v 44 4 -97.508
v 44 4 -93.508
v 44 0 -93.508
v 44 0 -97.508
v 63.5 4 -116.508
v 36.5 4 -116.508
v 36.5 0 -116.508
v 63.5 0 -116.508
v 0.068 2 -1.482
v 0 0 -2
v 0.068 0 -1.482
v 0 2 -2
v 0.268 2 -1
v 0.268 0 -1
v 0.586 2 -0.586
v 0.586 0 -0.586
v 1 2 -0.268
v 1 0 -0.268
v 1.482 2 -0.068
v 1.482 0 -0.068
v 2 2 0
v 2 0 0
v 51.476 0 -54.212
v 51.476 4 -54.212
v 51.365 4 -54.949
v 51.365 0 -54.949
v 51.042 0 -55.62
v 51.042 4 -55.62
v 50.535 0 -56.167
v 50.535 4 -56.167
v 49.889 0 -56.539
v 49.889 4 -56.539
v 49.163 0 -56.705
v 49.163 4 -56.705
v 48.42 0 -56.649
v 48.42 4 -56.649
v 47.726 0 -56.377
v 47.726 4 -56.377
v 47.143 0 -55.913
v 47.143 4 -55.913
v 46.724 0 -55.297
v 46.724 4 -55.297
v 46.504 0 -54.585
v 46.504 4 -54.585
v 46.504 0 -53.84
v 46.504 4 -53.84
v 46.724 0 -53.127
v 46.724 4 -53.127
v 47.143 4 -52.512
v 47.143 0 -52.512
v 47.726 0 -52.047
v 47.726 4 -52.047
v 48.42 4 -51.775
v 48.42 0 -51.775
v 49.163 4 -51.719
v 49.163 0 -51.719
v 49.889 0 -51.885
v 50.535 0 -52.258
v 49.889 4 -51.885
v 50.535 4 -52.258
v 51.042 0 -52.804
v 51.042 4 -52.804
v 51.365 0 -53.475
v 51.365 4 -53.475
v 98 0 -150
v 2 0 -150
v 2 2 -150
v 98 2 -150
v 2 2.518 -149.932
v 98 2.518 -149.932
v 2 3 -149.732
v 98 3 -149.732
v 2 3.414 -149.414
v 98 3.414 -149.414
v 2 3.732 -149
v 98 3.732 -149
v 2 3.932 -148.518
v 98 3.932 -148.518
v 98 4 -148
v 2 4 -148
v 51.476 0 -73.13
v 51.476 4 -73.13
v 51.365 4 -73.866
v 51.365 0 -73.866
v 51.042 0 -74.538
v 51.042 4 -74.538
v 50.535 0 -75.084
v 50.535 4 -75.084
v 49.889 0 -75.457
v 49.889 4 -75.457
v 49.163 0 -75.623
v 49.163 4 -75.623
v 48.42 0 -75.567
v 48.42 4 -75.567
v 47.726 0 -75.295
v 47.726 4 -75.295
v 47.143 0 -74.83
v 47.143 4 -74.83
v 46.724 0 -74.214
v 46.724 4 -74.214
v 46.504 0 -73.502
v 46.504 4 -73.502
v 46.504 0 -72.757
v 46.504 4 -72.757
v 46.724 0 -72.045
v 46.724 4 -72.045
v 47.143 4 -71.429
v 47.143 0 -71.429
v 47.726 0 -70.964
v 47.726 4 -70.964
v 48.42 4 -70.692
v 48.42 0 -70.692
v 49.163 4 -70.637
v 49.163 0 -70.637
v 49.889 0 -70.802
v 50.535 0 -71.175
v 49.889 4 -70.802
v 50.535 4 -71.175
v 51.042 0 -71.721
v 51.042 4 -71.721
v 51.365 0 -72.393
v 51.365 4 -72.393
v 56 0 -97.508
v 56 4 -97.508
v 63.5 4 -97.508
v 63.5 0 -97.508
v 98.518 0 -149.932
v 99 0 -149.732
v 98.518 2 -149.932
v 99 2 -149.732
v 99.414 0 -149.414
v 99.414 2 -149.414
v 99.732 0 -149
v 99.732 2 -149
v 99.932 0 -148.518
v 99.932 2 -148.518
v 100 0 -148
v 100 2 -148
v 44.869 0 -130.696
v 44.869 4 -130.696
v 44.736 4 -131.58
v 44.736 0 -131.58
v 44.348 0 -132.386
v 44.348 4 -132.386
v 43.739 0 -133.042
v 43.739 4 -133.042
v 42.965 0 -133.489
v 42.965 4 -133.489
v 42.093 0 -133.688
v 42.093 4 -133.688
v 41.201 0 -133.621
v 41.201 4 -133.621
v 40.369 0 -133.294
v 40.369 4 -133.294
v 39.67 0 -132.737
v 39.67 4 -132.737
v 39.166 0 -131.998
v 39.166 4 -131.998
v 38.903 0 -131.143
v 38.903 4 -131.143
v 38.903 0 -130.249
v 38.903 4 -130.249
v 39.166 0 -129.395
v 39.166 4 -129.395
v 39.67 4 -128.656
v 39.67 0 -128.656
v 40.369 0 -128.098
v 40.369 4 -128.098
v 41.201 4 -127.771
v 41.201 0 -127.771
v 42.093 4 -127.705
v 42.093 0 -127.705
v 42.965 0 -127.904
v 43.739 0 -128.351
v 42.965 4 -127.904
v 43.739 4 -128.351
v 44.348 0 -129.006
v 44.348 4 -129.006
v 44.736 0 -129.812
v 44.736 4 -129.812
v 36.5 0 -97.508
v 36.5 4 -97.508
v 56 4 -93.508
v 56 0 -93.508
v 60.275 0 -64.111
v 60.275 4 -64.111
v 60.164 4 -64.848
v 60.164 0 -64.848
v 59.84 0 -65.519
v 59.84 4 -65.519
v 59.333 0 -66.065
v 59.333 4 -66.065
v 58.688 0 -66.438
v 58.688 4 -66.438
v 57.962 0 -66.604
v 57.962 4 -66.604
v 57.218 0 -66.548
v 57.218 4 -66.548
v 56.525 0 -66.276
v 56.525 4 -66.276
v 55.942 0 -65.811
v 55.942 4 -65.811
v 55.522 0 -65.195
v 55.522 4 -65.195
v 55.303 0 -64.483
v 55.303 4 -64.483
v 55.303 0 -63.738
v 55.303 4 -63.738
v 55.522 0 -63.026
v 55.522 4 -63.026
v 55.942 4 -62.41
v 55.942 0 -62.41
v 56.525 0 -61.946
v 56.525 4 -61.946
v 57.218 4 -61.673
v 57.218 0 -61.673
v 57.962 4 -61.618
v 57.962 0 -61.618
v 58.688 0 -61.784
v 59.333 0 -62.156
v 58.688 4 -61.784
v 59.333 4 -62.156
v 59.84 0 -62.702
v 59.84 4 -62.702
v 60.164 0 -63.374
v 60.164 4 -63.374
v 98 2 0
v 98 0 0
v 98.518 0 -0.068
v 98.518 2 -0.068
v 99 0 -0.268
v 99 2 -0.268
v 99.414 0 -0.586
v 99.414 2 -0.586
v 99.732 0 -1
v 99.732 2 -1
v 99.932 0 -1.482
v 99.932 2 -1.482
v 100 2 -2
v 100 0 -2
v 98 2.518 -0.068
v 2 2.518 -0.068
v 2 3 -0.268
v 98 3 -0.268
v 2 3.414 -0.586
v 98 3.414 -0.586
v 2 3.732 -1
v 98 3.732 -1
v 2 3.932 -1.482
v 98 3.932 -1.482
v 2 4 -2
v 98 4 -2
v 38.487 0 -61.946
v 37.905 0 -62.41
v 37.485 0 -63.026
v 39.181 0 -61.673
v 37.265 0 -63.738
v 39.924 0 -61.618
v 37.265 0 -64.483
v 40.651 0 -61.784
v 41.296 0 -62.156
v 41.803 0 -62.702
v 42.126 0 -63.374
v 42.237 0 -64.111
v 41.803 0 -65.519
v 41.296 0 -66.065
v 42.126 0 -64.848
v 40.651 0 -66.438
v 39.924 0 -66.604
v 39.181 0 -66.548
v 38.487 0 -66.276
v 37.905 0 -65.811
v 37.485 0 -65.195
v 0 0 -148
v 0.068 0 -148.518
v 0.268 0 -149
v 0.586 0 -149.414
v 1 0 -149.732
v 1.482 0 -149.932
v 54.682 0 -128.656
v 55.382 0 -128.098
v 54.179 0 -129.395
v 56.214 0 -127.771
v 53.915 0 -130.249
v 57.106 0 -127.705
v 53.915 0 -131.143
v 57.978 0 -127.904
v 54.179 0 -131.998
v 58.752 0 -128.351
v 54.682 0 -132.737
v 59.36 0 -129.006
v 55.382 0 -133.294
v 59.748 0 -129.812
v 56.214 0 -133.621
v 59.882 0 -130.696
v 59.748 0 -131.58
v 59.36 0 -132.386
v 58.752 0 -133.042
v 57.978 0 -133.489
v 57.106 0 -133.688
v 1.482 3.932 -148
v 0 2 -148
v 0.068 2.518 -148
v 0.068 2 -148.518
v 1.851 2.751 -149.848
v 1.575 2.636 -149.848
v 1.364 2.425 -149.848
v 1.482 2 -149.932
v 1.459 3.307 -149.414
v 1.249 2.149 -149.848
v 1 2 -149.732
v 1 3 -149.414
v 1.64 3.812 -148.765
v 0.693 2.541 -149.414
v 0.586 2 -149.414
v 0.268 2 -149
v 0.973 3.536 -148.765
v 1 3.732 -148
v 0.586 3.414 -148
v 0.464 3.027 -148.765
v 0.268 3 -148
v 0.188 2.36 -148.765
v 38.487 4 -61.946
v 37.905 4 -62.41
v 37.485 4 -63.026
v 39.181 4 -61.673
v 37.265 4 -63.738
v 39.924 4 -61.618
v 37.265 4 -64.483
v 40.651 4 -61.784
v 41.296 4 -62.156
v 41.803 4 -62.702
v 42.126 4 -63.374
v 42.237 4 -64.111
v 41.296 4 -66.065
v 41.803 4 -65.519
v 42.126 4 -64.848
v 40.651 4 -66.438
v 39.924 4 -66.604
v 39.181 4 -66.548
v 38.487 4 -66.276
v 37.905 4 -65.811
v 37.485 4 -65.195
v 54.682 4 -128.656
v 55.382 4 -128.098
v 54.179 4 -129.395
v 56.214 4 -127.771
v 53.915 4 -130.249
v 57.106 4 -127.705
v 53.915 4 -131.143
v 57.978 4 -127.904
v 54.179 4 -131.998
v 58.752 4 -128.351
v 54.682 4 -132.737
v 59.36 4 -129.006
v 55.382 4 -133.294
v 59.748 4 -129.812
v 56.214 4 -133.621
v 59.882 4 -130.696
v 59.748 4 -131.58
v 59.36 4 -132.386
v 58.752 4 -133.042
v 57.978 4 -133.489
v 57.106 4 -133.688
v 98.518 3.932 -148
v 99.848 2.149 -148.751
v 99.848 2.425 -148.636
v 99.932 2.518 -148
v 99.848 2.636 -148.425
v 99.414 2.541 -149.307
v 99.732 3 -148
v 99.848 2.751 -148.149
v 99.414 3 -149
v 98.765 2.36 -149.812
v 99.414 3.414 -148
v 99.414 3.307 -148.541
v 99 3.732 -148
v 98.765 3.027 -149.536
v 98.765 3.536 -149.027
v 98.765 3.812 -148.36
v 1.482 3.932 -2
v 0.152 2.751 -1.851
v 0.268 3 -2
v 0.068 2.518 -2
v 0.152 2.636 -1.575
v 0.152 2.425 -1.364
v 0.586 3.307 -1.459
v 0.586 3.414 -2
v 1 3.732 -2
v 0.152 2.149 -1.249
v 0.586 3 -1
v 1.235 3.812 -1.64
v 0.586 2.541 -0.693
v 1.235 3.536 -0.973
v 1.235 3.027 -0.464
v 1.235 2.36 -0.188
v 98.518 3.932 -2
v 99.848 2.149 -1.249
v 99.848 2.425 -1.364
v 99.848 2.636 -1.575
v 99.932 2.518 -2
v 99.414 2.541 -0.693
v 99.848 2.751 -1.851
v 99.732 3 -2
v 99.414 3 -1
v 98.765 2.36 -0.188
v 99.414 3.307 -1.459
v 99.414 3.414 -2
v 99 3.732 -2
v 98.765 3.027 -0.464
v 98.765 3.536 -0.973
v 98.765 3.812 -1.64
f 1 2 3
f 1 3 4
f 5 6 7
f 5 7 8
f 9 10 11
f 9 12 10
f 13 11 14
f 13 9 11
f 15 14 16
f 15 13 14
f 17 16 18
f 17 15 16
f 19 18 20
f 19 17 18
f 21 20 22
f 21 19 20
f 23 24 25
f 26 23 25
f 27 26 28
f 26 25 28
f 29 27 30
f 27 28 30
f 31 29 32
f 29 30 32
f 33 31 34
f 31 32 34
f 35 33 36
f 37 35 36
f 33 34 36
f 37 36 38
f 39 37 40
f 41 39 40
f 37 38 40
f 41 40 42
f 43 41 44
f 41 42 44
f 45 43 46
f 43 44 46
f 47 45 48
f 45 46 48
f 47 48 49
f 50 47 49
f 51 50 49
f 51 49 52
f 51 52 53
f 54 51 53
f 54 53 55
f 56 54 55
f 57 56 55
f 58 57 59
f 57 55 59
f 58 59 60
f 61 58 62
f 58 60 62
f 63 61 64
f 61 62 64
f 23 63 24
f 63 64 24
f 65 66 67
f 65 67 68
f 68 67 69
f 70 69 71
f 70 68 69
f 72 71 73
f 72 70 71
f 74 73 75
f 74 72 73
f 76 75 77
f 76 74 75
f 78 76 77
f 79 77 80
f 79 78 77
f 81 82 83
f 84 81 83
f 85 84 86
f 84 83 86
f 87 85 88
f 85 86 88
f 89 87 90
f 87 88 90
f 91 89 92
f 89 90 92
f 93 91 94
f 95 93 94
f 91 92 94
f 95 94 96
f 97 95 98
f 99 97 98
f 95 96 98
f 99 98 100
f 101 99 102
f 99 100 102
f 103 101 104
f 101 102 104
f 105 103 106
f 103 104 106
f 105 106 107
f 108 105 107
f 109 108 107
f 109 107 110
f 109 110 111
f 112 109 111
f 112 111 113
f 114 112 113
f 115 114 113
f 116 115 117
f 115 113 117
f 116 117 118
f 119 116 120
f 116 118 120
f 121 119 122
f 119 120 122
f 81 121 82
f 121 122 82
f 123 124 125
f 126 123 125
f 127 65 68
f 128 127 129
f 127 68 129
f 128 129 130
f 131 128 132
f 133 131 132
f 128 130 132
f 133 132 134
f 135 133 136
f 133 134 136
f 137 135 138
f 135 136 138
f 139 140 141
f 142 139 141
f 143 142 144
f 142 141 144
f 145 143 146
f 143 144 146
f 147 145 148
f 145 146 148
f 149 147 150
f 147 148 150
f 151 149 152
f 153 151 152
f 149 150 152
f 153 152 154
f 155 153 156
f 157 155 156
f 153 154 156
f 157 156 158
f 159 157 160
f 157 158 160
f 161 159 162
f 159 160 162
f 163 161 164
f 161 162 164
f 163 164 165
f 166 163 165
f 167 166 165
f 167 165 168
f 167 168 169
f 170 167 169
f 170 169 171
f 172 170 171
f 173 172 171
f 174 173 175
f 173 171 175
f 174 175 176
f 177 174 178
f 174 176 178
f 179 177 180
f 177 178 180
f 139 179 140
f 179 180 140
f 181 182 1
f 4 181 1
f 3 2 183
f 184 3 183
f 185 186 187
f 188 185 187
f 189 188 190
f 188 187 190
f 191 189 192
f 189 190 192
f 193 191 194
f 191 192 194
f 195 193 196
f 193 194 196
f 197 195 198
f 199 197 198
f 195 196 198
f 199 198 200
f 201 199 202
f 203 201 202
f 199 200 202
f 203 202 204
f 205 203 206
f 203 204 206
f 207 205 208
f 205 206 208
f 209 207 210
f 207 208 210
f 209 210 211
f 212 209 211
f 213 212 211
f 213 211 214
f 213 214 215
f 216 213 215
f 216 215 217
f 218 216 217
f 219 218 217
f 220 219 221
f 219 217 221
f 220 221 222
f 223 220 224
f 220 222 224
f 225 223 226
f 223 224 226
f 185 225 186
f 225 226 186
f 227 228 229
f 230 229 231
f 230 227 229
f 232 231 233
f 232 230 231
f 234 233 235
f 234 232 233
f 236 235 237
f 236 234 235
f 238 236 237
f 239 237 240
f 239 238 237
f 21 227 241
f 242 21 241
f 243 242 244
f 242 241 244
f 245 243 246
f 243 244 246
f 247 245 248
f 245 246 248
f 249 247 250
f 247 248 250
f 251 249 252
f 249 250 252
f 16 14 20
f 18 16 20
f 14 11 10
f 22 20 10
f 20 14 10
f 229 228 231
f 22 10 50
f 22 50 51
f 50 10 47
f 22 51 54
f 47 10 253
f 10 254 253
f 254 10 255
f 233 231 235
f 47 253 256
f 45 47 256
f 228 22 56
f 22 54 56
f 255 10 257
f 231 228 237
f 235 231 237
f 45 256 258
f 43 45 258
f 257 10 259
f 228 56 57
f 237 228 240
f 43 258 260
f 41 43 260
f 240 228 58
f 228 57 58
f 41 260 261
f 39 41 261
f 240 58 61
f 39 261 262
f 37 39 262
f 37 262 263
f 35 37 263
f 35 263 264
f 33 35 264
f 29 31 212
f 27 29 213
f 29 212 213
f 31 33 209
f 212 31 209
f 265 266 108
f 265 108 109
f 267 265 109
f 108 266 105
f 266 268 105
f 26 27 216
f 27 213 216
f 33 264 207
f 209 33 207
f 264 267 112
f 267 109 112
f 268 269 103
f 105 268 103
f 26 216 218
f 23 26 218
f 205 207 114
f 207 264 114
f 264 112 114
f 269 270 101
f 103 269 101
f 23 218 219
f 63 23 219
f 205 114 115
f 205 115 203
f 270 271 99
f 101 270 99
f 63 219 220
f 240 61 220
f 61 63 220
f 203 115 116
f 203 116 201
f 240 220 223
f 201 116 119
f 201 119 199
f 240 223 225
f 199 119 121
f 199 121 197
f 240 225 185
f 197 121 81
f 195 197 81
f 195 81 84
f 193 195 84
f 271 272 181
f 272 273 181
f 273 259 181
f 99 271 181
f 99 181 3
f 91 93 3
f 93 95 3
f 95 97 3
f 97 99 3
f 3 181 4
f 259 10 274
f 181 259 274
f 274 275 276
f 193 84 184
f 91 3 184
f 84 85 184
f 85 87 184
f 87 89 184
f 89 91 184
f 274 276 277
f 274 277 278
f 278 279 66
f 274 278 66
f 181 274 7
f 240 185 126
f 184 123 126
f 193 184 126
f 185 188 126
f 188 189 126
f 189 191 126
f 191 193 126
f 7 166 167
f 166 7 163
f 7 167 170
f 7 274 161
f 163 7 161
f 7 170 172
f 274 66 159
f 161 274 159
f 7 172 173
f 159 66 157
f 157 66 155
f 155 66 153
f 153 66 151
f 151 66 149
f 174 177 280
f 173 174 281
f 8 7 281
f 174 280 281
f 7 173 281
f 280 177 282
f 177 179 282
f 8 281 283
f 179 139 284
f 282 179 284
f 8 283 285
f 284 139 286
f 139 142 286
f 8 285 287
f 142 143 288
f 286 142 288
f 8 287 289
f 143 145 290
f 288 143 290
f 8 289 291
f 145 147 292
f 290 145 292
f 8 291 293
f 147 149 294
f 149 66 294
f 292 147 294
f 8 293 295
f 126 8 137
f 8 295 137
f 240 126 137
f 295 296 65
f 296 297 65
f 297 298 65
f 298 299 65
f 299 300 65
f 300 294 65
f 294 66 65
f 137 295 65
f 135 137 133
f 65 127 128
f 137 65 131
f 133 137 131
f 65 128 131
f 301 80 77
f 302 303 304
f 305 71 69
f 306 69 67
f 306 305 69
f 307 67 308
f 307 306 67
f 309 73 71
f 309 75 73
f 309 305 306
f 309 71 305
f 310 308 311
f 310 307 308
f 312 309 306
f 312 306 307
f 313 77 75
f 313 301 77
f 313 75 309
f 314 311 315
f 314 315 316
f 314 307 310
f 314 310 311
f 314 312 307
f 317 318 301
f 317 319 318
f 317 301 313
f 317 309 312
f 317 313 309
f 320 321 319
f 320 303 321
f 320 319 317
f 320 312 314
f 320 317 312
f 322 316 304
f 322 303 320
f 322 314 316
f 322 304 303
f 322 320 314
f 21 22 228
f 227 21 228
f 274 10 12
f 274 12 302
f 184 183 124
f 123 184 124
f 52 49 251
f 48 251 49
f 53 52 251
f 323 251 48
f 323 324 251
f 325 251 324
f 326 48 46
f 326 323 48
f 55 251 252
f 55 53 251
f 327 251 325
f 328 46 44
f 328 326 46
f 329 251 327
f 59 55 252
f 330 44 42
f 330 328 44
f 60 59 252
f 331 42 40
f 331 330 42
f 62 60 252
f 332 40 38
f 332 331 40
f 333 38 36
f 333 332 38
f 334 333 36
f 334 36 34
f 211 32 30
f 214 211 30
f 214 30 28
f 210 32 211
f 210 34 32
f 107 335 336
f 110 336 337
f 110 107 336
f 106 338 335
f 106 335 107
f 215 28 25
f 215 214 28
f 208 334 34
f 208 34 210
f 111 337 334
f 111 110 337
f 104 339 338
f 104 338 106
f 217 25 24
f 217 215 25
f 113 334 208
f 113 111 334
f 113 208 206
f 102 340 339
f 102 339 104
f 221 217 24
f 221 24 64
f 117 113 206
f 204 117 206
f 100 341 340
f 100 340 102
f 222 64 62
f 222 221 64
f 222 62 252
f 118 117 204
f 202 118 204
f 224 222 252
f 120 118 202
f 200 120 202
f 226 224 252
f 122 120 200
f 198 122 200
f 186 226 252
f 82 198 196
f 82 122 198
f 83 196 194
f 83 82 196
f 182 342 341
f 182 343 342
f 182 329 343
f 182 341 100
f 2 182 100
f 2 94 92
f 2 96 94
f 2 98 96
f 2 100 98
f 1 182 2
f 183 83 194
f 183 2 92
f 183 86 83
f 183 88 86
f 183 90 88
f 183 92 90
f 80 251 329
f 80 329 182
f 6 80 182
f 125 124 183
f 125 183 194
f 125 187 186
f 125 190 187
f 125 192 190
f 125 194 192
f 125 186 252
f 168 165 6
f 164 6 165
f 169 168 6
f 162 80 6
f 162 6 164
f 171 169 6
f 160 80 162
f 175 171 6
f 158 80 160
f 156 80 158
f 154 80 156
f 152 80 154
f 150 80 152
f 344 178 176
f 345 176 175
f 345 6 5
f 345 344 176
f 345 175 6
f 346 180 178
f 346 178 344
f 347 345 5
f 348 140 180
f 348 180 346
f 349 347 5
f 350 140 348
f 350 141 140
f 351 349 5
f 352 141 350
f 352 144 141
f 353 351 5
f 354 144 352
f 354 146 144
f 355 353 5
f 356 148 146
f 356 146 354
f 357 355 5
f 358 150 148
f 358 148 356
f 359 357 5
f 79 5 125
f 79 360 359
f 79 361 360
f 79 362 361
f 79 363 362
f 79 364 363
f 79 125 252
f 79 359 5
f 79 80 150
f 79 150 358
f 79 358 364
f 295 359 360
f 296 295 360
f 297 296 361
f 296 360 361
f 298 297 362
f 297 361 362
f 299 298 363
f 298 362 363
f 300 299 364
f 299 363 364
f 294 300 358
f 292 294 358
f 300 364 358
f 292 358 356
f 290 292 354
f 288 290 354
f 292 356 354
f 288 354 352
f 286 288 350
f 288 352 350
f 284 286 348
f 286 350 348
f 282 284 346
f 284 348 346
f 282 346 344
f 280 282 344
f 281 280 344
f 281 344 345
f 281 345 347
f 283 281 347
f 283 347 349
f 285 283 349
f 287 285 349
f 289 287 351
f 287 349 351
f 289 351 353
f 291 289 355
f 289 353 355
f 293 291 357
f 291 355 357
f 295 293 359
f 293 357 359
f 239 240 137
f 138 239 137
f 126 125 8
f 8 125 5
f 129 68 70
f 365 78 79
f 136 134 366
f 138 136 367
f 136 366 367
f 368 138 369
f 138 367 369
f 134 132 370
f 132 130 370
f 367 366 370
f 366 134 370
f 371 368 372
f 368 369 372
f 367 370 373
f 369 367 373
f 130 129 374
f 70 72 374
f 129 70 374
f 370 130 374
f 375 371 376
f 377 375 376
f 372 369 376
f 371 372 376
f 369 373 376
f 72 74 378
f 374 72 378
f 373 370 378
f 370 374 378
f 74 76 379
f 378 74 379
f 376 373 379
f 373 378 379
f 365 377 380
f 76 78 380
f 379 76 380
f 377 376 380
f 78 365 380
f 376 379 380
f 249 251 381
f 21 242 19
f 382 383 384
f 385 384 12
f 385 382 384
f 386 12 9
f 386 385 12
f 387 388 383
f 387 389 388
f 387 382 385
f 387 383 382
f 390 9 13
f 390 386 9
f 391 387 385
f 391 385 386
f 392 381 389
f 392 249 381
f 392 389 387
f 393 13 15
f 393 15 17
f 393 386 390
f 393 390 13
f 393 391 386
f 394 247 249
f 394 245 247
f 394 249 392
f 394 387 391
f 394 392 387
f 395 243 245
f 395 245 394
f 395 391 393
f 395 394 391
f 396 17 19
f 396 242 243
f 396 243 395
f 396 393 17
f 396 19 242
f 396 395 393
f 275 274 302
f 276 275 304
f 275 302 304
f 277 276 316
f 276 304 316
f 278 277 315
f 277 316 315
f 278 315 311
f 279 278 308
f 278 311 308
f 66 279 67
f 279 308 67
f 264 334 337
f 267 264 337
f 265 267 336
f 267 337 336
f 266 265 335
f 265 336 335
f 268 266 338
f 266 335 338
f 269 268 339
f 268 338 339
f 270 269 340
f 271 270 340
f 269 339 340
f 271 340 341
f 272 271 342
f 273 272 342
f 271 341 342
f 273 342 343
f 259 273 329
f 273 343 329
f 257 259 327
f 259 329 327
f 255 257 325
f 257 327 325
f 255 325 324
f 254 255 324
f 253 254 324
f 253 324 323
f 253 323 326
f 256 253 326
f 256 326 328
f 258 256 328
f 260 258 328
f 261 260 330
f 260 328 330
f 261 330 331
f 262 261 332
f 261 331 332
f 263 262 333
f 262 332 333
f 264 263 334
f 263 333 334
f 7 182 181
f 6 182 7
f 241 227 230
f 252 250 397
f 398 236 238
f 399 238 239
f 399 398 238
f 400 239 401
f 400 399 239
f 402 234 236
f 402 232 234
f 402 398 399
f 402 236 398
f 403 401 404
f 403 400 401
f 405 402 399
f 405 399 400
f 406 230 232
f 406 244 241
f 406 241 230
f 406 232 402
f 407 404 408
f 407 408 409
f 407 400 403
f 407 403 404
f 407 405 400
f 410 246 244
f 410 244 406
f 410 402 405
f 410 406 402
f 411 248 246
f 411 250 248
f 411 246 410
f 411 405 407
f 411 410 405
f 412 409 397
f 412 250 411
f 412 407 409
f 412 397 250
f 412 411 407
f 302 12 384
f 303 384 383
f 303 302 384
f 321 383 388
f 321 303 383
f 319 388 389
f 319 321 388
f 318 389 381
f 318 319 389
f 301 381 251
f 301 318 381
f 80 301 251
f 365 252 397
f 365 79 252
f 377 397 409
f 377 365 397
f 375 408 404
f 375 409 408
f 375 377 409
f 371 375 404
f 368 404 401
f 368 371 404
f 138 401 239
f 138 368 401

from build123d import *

# Parameters (mm, degrees)
SKETCH1_W           = 100
SKETCH1_H           = 150
BOSS_EXTRUDE1_DEPTH = 4
CUT_EXTRUDE1_DEPTH  = 4
SKETCH2_4_W         = 12
SKETCH2_4_H         = 4
CUT_EXTRUDE2_DEPTH  = 4
SKETCH3_R           = 2.5
CUT_EXTRUDE3_DEPTH  = 4
SKETCH4_R           = 3
CUT_EXTRUDE4_DEPTH  = 4
FILLET1_R           = 2


with BuildPart() as part:
    # Sketch1 → Boss-Extrude1 (new body)
    with BuildSketch(Plane(origin=(0, 0, 0), x_dir=(1, 0, 0), z_dir=(0, 1, 0))):
        with Locations((50, 75)):
            Rectangle(SKETCH1_W, SKETCH1_H)
    extrude(amount=BOSS_EXTRUDE1_DEPTH)

    # Sketch2 → Cut-Extrude1 (cut)
    with BuildSketch(Plane(origin=(0, 4, 0), x_dir=(1, 0, 0), z_dir=(0, 1, 0))):
        Polygon((63.5, 116.508398101), (36.5, 116.508398101), (36.5, 97.508398101), (44, 97.508398101), (56, 97.508398101), (63.5, 97.508398101), align=None)
    extrude(amount=-CUT_EXTRUDE1_DEPTH, mode=Mode.SUBTRACT)

    # Sketch2<4> → Cut-Extrude2 (cut)
    with BuildSketch(Plane(origin=(0, 4, 0), x_dir=(1, 0, 0), z_dir=(0, 1, 0))):
        with Locations((50, 95.508398101)):
            Rectangle(SKETCH2_4_W, SKETCH2_4_H)
    extrude(amount=-CUT_EXTRUDE2_DEPTH, mode=Mode.SUBTRACT)

    # Sketch3 → Cut-Extrude3 (cut)
    with BuildSketch(Plane(origin=(0, 4, 0), x_dir=(1, 0, 0), z_dir=(0, 1, 0))):
        with Locations((48.975949338, 73.129510144)):
            Circle(SKETCH3_R)
        with Locations((48.975949338, 54.212155816)):
            Circle(SKETCH3_R)
        with Locations((57.774718793, 64.110771453)):
            Circle(SKETCH3_R)
        with Locations((39.737241411, 64.110771453)):
            Circle(SKETCH3_R)
    extrude(amount=-CUT_EXTRUDE3_DEPTH, mode=Mode.SUBTRACT)

    # Sketch4 → Cut-Extrude4 (cut)
    with BuildSketch(Plane(origin=(0, 4, 0), x_dir=(1, 0, 0), z_dir=(0, 1, 0))):
        with Locations((56.881630687, 130.696209526)):
            Circle(SKETCH4_R)
        with Locations((41.869015261, 130.696209526)):
            Circle(SKETCH4_R)
    extrude(amount=-CUT_EXTRUDE4_DEPTH, mode=Mode.SUBTRACT)

    # Fillet1
    fillet1_edges = [part.edges().sort_by_distance(p)[0] for p in [
        (0, 2, 0),
        (50, 4, 0),
        (100, 2, 0),
        (100, 4, -75),
        (100, 2, -150),
        (0, 2, -150),
        (0, 4, -75),
        (50, 4, -150),
    ]]
    fillet(fillet1_edges, radius=FILLET1_R)


solid = part.part
